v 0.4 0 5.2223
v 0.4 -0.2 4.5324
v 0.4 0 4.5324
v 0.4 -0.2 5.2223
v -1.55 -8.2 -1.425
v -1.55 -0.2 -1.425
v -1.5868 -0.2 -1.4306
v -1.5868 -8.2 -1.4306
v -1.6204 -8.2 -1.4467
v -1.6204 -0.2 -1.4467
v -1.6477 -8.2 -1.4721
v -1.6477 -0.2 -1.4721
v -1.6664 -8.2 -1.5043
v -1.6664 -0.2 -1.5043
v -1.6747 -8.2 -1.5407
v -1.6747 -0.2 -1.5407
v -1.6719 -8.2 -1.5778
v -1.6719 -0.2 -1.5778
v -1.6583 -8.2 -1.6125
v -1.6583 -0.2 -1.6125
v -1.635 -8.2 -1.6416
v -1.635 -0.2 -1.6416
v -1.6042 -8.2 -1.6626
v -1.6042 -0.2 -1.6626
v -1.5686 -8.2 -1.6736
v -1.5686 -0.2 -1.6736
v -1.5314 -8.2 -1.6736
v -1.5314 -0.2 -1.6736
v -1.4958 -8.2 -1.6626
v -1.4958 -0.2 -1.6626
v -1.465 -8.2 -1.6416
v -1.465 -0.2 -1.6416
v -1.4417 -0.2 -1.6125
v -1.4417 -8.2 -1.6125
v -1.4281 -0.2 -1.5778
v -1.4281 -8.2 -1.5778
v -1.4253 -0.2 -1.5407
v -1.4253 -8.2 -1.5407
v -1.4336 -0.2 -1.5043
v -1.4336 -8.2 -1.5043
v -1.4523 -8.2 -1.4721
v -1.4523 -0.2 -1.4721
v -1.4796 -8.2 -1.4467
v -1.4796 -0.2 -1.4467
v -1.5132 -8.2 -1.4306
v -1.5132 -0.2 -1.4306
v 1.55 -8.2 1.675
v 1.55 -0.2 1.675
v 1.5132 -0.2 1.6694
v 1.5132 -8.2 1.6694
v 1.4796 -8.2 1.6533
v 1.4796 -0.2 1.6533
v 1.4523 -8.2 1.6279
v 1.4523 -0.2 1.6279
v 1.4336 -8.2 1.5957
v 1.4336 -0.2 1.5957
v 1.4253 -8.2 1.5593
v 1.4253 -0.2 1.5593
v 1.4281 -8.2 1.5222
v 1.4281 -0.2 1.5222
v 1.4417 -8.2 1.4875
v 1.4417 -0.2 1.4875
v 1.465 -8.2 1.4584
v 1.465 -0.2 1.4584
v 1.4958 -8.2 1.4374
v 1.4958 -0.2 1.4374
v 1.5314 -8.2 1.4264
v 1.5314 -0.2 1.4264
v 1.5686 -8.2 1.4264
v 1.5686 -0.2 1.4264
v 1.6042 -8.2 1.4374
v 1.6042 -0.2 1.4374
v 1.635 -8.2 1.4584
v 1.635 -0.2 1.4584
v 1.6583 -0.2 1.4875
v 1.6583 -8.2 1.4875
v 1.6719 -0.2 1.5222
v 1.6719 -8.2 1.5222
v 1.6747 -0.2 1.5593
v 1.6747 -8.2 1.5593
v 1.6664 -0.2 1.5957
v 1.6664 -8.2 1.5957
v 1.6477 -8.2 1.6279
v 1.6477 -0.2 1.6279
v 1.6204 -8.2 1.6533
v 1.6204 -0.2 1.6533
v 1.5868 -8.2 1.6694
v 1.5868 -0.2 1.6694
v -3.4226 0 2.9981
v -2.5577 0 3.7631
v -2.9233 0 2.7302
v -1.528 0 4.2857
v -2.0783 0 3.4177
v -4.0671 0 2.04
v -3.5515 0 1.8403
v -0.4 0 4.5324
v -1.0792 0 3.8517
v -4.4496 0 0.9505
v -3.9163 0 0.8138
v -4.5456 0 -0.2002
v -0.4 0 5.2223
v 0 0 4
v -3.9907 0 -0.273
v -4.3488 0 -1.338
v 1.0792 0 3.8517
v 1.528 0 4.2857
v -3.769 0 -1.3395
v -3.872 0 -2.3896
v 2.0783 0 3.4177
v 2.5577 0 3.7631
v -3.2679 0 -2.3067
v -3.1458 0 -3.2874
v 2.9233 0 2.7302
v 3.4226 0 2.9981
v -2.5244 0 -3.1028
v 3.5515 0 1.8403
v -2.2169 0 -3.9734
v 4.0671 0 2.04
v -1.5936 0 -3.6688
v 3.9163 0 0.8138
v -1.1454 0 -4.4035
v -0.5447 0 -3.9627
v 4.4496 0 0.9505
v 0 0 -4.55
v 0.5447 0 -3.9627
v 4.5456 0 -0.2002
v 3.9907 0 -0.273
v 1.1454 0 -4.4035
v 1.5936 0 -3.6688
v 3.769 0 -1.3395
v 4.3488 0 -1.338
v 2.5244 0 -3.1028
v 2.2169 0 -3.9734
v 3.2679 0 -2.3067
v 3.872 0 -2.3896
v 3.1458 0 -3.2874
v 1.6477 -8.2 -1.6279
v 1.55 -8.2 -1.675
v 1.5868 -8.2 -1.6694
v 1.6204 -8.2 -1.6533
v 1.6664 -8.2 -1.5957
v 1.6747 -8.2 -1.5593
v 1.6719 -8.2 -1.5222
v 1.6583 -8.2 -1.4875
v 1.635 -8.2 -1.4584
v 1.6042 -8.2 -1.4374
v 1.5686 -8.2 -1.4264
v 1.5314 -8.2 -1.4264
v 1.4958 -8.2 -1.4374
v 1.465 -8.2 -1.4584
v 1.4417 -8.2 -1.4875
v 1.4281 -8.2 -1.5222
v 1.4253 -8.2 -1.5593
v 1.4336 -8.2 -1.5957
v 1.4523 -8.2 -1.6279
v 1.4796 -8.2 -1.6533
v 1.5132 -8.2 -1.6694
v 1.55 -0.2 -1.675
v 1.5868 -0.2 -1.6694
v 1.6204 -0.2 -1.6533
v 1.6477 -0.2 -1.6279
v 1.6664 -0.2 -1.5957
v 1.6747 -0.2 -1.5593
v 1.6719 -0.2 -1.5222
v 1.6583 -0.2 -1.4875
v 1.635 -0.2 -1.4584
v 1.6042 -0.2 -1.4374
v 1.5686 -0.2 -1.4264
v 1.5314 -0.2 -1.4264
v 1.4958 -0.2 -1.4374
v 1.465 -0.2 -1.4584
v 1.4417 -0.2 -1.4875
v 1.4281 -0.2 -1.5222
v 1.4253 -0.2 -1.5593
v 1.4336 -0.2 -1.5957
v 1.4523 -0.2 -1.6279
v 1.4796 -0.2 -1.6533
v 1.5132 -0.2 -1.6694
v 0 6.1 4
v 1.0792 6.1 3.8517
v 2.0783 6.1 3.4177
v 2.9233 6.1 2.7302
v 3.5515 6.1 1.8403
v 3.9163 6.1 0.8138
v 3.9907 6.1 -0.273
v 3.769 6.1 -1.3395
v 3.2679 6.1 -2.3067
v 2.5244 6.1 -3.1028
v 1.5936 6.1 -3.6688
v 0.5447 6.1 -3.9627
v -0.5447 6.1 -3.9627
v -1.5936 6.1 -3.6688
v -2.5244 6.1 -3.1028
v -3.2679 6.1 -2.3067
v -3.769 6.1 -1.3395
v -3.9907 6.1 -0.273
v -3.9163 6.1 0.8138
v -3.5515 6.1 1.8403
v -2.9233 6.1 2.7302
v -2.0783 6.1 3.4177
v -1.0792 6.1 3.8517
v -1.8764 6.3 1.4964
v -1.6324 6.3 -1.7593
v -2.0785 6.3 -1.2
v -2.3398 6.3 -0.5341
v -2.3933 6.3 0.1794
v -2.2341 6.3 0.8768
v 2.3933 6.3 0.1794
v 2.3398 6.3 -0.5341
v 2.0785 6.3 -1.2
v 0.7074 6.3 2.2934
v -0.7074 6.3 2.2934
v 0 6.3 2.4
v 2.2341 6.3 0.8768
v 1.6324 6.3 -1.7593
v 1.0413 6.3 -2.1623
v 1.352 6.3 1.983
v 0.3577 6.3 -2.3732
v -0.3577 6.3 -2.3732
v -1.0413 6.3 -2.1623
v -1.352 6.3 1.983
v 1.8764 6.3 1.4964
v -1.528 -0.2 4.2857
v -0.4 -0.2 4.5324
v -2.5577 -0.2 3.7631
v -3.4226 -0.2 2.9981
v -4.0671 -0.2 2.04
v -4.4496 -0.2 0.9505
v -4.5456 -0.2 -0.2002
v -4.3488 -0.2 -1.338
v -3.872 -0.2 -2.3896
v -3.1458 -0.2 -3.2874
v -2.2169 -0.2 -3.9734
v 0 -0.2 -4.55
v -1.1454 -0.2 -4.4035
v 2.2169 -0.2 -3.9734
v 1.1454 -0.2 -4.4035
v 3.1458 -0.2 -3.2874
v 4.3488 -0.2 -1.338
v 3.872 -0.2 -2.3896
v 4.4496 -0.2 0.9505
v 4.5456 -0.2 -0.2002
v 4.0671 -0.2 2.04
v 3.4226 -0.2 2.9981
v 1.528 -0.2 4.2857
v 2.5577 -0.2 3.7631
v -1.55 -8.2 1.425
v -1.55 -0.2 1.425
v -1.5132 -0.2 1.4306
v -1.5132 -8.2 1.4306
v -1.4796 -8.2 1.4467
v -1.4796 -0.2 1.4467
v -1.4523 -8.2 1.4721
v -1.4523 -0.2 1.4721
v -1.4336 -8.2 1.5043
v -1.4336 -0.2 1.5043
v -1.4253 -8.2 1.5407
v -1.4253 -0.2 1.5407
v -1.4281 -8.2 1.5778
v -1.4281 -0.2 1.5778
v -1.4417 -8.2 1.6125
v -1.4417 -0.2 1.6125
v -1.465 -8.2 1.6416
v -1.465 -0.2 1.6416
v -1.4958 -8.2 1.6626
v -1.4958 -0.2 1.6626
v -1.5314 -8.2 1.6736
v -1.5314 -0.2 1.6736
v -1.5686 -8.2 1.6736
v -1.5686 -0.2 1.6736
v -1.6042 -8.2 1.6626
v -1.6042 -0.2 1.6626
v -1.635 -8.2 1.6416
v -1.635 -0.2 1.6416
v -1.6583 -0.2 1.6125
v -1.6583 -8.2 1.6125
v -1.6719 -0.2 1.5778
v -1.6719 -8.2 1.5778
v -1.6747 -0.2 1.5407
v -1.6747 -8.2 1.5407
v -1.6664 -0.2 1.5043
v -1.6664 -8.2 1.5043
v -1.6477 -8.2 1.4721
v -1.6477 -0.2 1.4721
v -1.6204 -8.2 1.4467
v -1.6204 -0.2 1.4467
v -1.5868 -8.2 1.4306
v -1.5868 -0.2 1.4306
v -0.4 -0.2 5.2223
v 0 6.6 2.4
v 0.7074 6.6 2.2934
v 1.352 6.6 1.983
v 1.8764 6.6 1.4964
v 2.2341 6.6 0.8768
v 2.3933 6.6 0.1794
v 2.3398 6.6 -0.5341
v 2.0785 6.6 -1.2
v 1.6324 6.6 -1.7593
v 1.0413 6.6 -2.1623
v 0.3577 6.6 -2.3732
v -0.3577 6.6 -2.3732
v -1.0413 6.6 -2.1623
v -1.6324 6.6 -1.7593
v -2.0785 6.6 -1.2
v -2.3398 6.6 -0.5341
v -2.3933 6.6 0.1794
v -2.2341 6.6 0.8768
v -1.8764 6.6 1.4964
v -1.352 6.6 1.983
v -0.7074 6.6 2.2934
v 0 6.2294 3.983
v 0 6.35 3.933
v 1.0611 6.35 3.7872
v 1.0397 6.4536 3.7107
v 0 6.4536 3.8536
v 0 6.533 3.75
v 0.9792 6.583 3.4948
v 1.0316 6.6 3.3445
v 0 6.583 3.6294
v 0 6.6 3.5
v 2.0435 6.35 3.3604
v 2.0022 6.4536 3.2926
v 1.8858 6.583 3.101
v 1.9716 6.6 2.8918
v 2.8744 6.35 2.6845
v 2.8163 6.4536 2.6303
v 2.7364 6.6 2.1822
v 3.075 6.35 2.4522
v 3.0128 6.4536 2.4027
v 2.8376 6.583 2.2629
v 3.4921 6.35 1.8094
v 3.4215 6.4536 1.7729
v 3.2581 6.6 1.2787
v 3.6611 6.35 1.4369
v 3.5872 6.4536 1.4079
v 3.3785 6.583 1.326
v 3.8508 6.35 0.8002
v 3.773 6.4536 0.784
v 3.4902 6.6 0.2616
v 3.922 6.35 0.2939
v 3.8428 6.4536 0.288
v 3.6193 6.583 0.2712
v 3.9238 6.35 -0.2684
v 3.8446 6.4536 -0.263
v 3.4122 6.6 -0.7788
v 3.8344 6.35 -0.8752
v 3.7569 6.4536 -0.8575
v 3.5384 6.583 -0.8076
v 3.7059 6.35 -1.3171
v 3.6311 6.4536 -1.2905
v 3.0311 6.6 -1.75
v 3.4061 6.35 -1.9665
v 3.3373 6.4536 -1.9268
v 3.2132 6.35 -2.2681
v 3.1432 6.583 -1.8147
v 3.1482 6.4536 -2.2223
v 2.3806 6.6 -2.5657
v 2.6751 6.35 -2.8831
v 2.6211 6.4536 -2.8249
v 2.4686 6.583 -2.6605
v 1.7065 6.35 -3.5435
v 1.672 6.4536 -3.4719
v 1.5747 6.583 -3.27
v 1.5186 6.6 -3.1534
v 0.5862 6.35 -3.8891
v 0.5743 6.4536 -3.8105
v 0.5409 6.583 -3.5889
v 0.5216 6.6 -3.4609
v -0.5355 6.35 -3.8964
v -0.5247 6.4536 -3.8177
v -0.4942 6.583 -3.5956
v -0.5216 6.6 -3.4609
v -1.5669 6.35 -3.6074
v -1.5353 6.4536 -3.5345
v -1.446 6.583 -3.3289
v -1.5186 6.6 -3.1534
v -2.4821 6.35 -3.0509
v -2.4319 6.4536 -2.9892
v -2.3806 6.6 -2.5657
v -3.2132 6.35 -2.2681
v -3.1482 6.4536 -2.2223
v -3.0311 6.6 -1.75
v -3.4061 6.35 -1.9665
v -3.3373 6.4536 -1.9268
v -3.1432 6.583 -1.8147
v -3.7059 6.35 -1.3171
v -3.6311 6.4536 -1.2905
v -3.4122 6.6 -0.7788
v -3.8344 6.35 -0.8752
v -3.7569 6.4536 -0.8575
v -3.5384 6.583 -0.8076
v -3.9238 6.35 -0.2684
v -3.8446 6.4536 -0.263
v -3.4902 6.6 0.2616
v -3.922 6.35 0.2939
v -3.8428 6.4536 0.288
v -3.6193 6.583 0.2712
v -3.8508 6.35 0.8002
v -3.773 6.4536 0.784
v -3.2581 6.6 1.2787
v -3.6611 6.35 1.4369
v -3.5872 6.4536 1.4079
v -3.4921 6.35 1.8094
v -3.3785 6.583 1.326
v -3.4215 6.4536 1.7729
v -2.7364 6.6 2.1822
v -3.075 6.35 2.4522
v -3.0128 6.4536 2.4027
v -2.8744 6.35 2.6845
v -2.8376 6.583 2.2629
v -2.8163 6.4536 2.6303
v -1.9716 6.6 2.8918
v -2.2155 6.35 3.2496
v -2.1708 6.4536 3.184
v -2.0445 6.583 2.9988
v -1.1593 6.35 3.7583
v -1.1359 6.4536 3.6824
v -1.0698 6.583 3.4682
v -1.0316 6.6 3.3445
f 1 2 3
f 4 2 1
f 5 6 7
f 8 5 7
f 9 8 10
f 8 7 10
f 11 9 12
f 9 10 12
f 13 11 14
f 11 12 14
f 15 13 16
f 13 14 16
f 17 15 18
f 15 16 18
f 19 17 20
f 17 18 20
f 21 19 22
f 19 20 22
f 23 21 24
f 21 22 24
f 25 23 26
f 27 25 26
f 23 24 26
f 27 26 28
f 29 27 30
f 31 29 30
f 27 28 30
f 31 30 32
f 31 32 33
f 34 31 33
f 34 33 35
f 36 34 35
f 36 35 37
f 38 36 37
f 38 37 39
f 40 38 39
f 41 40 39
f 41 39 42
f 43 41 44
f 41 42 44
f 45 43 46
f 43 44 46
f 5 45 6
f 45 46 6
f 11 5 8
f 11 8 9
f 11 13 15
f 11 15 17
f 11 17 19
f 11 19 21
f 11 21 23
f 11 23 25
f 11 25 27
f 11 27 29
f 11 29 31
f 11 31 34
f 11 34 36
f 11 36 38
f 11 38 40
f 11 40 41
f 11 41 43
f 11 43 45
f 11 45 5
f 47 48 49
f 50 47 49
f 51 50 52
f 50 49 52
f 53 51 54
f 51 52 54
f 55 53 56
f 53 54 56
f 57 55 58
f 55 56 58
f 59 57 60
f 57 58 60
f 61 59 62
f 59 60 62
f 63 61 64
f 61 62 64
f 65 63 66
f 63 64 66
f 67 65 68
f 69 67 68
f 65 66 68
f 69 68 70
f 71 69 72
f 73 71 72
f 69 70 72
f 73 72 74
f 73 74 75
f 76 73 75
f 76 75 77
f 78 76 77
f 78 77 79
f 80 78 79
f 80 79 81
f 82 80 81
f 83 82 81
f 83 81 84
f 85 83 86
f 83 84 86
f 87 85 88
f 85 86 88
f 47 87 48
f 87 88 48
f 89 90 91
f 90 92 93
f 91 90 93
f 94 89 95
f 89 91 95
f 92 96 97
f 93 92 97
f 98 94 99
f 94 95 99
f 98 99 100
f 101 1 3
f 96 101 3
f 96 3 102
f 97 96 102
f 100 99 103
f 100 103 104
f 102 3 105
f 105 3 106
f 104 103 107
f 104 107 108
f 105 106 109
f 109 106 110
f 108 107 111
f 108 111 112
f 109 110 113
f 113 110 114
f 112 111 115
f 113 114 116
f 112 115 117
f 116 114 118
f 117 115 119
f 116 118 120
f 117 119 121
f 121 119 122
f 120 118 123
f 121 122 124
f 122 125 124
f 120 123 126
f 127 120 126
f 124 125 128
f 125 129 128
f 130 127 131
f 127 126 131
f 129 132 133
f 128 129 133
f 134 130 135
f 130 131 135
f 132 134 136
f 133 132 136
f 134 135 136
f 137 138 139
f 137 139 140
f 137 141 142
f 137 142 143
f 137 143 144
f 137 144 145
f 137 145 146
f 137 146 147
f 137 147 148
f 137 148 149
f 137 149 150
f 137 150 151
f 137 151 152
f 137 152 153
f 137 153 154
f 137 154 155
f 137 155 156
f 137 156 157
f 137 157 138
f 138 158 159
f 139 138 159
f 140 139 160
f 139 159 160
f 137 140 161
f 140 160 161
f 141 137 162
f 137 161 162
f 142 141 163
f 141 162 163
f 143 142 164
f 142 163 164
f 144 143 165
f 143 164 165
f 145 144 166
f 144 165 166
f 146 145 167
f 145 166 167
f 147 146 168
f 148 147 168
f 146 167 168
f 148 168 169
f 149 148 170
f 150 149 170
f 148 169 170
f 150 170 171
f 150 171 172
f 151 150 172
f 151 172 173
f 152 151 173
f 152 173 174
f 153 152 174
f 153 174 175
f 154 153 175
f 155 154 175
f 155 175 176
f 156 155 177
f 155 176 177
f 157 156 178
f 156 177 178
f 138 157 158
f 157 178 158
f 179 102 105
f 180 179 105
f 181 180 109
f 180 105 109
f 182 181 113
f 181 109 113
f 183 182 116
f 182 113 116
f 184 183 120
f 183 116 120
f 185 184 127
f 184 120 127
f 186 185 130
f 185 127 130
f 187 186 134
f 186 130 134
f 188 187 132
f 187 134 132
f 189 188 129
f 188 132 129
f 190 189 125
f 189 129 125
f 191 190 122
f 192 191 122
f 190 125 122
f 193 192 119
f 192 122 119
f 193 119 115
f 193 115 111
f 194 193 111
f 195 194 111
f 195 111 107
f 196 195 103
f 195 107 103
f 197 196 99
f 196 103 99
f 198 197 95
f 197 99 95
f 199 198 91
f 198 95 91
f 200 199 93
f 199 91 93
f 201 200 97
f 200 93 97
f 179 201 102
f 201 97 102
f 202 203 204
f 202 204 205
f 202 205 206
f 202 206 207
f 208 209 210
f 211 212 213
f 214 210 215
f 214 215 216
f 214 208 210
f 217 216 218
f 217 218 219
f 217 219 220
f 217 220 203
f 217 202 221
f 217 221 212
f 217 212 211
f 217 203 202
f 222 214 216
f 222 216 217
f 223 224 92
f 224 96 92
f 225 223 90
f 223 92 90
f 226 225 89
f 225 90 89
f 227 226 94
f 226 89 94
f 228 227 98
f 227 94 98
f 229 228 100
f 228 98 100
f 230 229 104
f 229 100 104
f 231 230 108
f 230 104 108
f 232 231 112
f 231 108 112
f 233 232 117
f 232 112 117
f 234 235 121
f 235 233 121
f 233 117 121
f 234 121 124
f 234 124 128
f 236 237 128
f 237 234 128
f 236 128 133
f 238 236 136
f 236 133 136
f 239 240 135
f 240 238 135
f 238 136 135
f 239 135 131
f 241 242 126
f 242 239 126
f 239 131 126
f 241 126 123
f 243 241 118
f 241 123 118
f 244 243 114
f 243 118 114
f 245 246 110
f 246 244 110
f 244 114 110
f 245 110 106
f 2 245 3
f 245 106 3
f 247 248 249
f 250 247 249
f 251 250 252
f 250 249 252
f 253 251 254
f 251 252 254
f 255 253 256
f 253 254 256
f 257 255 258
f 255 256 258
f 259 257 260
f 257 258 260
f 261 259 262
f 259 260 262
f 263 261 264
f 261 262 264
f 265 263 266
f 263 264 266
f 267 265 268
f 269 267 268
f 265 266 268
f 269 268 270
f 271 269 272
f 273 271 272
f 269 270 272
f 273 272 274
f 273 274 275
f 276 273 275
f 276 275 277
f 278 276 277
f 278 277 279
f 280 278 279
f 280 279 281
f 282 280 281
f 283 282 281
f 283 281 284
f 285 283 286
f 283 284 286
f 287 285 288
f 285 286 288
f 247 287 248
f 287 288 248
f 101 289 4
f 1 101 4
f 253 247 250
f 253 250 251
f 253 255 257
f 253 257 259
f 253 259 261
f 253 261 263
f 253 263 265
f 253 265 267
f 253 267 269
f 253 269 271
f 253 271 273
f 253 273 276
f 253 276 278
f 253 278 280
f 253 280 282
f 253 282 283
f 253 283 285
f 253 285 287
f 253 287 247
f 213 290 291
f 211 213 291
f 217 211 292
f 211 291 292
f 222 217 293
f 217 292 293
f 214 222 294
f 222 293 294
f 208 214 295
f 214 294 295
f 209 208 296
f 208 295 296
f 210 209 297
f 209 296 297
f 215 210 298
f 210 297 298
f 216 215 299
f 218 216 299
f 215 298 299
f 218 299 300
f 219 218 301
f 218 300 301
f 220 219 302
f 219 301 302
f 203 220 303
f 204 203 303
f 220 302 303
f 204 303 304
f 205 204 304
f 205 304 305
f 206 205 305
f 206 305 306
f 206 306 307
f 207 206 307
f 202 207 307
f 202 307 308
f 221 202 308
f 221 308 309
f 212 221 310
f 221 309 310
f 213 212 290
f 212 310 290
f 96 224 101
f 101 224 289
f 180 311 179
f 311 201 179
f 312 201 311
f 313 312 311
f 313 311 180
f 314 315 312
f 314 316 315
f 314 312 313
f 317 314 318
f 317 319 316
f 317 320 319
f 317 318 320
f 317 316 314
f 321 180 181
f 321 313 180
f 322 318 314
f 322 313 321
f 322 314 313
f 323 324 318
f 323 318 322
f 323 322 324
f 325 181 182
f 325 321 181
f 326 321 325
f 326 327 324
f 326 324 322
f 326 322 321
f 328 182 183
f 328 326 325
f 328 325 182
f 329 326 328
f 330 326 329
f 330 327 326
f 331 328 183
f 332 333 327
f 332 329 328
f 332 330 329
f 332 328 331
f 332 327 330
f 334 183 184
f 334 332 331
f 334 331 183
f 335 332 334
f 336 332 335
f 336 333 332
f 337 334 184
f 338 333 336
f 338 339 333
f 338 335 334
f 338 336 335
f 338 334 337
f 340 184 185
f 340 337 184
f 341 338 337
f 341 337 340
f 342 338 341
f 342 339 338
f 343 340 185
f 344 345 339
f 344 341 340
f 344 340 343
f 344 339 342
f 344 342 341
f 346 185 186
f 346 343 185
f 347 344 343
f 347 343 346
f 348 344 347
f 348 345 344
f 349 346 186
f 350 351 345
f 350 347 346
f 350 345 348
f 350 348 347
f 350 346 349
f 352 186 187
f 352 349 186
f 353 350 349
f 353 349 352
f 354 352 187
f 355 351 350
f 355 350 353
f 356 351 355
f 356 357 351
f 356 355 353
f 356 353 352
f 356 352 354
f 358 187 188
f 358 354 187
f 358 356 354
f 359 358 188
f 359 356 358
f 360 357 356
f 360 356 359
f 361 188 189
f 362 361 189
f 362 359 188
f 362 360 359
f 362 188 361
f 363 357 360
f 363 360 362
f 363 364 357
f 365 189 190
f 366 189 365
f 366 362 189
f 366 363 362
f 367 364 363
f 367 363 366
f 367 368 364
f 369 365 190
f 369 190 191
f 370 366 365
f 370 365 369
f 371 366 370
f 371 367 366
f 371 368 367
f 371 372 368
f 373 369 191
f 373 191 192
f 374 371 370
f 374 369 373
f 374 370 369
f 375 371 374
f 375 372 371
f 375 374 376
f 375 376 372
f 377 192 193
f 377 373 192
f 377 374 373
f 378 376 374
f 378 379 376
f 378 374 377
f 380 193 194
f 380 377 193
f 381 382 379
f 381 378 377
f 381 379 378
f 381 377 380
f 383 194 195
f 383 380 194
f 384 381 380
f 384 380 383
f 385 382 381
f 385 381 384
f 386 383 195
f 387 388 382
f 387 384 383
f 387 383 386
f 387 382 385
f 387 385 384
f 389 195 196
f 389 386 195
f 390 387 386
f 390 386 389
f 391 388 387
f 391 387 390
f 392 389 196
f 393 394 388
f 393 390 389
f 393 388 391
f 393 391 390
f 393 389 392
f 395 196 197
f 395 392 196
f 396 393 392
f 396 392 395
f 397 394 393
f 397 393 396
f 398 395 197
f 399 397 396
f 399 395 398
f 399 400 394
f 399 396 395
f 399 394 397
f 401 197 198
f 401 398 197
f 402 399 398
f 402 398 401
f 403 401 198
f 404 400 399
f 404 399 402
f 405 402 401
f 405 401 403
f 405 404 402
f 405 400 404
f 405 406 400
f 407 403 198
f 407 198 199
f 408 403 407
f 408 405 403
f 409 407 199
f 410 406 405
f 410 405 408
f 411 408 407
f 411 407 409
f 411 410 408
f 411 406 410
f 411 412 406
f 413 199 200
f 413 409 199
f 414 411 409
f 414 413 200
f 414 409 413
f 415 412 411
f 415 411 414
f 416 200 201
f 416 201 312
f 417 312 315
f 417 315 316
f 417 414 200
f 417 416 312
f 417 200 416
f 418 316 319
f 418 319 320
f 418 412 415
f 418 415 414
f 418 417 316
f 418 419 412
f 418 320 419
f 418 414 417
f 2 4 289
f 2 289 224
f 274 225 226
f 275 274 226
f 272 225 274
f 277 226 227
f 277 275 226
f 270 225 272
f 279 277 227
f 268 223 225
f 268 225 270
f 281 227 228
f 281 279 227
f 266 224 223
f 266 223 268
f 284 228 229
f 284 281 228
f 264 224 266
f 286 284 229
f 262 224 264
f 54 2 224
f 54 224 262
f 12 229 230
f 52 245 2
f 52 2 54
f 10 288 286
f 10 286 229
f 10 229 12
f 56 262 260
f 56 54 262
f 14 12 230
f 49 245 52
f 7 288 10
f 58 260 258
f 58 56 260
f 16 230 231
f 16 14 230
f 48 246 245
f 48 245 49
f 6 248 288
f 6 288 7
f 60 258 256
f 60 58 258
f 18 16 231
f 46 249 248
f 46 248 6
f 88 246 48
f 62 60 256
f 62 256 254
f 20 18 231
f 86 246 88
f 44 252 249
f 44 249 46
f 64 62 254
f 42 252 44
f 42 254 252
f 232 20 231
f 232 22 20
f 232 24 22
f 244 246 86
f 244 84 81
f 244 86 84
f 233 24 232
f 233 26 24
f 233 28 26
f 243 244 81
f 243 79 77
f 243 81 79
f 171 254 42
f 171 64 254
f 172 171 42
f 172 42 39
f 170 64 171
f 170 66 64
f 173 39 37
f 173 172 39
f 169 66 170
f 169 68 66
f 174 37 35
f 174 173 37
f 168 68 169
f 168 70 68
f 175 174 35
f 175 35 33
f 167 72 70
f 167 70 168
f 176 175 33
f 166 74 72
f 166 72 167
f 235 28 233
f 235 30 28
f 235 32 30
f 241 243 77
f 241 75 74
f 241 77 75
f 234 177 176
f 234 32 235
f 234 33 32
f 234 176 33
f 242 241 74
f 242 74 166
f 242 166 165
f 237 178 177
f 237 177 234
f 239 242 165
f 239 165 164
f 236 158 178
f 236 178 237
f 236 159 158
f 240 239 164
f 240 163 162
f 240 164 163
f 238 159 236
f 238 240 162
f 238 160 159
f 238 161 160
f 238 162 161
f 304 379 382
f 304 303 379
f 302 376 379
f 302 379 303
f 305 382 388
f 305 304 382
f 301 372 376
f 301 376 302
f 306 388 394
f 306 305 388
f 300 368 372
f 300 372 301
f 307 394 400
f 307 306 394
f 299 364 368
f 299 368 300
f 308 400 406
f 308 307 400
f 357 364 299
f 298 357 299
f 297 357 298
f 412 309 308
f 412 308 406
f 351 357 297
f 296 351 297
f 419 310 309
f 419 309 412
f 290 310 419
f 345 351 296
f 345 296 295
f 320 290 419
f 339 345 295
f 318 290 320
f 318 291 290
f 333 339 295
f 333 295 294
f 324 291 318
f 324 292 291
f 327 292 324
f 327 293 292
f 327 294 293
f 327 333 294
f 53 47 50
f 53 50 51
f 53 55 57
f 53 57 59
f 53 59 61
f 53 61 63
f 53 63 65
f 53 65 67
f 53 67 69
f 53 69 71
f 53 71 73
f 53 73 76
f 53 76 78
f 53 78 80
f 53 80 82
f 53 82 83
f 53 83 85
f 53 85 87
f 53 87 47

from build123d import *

# Parameters (mm, degrees)
SKETCH_1_R          = 4
EXTRUDE_1_DEPTH     = 6.6
SKETCH_2_R          = 4.55
EXTRUDE_2_DEPTH     = 0.2
SKETCH_5_W          = 0.8
SKETCH_5_H          = 0.992889455
EXTRUDE_4_DEPTH     = 0.2
SKETCH_4_R          = 2.4
CUT_EXTRUDE_1_DEPTH = 0.3
FILLET_1_R          = 0.5
SKETCH_3_R          = 0.125
EXTRUDE_3_DEPTH     = 8


with BuildPart() as part:
    # 草图1 → 凸台-拉伸1 (new body)
    with BuildSketch(Plane(origin=(0, 0, 0), x_dir=(1, 0, 0), z_dir=(0, 1, 0))):
        with Locations(Location((0, 0, 0), (0, 0, 270))):
            Circle(SKETCH_1_R)
    extrude(amount=EXTRUDE_1_DEPTH)

    # 草图2 → 凸台-拉伸2 (add)
    with BuildSketch(Plane.XZ):
        with Locations(Location((0, 0, 0), (0, 0, 270))):
            Circle(SKETCH_2_R)
    extrude(amount=EXTRUDE_2_DEPTH)

    # 草图5 → 凸台-拉伸4 (add)
    with BuildSketch(Plane.XZ.offset(0.2)):
        with Locations((0, 4.725827174)):
            Rectangle(SKETCH_5_W, SKETCH_5_H)
    extrude(amount=-EXTRUDE_4_DEPTH)

    # 草图4 → 切除-拉伸1 (cut)
    with BuildSketch(Plane(origin=(0, 6.6, 0), x_dir=(1, 0, 0), z_dir=(0, 1, 0))):
        with Locations(Location((0, 0, 0), (0, 0, 270))):
            Circle(SKETCH_4_R)
    extrude(amount=-CUT_EXTRUDE_1_DEPTH, mode=Mode.SUBTRACT)

    # 圆角1
    fillet_1_edges = [part.edges().sort_by_distance(p)[0] for p in [
        (0, 6.6, -4),
    ]]
    fillet(fillet_1_edges, radius=FILLET_1_R)

    # 草图3 → 凸台-拉伸3 (add)
    with BuildSketch(Plane.XZ.offset(0.2)):
        with Locations(Location((-1.55, 1.55, 0), (0, 0, 270))):
            Circle(SKETCH_3_R)
        with Locations(Location((1.55, 1.55, 0), (0, 0, 90))):
            Circle(SKETCH_3_R)
        with Locations(Location((1.55, -1.55, 0), (0, 0, 270))):
            Circle(SKETCH_3_R)
        with Locations(Location((-1.55, -1.55, 0), (0, 0, 90))):
            Circle(SKETCH_3_R)
    extrude(amount=EXTRUDE_3_DEPTH)


solid = part.part
